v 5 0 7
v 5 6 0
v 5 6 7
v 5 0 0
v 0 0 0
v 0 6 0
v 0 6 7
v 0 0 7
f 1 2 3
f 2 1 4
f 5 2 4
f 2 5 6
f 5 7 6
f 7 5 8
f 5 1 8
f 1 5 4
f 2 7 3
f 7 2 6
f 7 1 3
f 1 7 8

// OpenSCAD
translate([2.5, 1.5, 1.0]) color([0.6117708643248599, 0.38668300553323576, 0.04703291581184044]) cube([5, 3, 2], center=true);
translate([2.5, 4.5, 1.0]) color([0.4708892090480652, 0.15136775389483625, 0.03246546237394399]) cube([5, 3, 2], center=true);
translate([2.5, 1.5, 3.0]) color([0.6174004236810055, 0.6299662912183356, 0.10529282465636491]) cube([5, 3, 2], center=true);
translate([2.5, 4.5, 3.0]) color([0.5491437662317772, 0.3466679766399683, 0.3834140731648874]) cube([5, 3, 2], center=true);
translate([2.5, 1.0, 5.5]) color([0.7764198986996783, 0.49031967752424566, 0.8812766154122413]) cube([5, 2, 3], center=true);
translate([2.5, 3.0, 5.5]) color([0.6101197429062234, 0.4671884150380703, 0.6323126400553846]) cube([5, 2, 3], center=true);
translate([2.5, 5.0, 5.5]) color([0.3378653798287524, 0.12432379252825243, 0.6825296186925238]) cube([5, 2, 3], center=true);
